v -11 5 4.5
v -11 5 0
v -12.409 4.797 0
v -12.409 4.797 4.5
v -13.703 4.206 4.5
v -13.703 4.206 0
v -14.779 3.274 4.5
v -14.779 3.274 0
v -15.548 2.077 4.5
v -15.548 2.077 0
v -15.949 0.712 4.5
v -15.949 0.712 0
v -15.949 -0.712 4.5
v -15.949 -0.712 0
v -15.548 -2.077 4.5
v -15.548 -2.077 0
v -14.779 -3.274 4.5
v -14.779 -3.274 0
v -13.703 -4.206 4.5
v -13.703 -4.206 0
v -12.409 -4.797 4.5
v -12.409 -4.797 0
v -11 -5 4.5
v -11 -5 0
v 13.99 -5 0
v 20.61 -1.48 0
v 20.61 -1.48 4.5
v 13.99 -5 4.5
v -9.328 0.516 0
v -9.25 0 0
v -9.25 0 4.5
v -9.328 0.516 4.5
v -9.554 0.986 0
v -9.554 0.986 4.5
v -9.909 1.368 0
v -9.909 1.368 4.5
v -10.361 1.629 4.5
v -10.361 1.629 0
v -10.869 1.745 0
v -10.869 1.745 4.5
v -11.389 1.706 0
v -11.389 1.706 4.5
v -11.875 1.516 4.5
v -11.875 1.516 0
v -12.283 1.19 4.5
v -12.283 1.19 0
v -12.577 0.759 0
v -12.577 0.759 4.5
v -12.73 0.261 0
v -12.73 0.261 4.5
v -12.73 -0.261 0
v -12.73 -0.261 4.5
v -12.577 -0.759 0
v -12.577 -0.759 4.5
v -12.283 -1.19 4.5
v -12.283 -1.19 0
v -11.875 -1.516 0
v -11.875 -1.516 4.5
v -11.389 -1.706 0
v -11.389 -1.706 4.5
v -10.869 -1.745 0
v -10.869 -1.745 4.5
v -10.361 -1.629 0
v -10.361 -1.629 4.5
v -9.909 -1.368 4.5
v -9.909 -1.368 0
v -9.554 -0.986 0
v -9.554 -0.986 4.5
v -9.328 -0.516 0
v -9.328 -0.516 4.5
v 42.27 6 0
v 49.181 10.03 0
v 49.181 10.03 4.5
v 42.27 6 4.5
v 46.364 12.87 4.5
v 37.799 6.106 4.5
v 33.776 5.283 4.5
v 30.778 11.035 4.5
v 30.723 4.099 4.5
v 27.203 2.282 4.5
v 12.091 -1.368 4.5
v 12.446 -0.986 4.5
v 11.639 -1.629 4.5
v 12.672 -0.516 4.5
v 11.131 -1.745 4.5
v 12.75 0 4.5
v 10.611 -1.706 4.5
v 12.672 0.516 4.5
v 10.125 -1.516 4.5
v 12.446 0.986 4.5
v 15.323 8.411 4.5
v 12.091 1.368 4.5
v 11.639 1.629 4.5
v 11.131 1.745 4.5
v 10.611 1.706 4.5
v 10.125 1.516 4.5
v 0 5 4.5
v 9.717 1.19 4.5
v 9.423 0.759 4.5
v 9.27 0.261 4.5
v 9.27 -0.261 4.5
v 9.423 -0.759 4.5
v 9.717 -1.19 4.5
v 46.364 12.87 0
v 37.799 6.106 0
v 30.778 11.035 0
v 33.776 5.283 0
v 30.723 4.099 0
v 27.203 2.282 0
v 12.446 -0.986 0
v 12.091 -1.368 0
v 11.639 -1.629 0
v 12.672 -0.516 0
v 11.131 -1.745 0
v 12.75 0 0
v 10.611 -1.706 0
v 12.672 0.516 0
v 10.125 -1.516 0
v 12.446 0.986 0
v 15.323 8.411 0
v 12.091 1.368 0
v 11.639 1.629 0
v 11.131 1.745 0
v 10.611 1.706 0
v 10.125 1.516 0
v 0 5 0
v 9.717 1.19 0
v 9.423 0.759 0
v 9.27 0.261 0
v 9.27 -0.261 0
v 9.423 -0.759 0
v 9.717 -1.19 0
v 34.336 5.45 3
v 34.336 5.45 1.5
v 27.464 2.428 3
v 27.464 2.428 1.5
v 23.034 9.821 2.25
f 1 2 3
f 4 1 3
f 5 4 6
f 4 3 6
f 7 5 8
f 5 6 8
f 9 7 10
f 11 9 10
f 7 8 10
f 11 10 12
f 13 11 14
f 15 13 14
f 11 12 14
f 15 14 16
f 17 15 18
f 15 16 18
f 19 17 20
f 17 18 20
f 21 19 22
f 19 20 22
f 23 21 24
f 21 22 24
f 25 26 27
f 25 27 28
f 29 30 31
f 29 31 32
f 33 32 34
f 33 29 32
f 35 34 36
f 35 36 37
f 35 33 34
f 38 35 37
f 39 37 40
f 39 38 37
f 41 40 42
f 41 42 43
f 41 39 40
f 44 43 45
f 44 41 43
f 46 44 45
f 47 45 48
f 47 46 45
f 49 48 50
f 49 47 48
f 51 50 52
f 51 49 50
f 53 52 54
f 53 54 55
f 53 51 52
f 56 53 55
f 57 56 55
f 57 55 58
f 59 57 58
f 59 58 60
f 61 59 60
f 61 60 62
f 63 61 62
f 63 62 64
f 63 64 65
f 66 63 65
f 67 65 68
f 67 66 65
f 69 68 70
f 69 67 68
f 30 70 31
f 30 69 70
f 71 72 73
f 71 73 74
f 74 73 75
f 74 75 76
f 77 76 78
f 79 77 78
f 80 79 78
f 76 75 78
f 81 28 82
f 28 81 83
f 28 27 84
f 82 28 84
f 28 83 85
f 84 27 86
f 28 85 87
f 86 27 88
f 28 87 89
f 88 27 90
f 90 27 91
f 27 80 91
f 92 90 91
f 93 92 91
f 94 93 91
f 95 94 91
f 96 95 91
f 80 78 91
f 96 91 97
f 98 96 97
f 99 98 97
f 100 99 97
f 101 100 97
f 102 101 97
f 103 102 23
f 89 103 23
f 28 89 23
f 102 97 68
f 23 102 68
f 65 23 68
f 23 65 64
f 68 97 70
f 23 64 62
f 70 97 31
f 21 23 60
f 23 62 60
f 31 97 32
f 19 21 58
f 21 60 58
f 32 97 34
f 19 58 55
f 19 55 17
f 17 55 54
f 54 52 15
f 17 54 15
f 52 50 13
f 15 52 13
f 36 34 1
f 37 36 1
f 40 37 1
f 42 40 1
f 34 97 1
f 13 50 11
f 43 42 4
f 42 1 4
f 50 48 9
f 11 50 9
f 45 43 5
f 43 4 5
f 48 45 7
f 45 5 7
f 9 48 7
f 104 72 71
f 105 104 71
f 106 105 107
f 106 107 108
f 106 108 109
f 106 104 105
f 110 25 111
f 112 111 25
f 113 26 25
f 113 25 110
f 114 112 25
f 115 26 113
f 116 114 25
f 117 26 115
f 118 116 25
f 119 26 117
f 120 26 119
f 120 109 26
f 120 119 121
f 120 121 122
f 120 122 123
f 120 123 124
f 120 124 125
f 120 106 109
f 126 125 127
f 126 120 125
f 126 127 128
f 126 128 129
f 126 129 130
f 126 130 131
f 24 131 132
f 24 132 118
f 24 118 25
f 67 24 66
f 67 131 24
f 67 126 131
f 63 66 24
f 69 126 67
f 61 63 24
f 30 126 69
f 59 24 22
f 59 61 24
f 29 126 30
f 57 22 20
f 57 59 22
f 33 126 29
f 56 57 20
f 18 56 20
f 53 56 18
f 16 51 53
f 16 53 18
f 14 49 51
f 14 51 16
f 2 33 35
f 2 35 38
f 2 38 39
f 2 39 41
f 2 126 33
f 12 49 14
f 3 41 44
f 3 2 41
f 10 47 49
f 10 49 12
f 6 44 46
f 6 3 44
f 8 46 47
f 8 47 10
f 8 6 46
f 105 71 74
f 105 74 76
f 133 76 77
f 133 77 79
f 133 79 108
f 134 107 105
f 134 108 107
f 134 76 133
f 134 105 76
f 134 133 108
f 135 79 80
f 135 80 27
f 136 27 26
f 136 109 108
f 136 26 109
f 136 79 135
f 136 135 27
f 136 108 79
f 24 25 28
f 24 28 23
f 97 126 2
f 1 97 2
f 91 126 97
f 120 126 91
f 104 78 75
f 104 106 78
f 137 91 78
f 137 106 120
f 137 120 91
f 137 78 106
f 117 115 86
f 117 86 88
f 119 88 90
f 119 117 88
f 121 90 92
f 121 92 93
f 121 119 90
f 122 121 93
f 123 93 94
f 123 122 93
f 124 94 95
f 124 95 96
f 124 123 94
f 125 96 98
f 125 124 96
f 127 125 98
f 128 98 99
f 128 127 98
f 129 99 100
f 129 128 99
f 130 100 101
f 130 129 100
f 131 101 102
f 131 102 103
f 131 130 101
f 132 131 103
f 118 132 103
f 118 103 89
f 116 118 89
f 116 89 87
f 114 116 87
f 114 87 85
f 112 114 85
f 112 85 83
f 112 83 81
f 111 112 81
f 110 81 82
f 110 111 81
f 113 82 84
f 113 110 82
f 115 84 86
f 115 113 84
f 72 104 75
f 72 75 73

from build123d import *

# Parameters (mm, degrees)
SKETCH1_R           = 5
SKETCH1_R_2         = 1.75
BOSS_EXTRUDE1_DEPTH = 4.5
BOSS_EXTRUDE2_START = -4.5
BOSS_EXTRUDE2_DEPTH = 4.5


with BuildPart() as part:
    # Sketch1 → Boss-Extrude1 (new body)
    # profile 1 of 3: a face of its own
    with BuildSketch(Plane.XY):
        with BuildLine():
            Line((-11.000000031, -5), (11, -5))
            ThreePointArc((11, -5), (6, -6e-09), (10.999999988, 5))
            Line((10.999999988, 5), (-11, 5))
            ThreePointArc((-11, 5), (-7.464466094, 3.535533906), (-6, 0))
            ThreePointArc((-6, 0), (-7.464466105, -3.535533917), (-11.000000031, -5))
        make_face()
    # profile 2 of 3: a face of its own
    with BuildSketch(Plane.XY):
        with Locations((-11, 0)):
            Circle(SKETCH1_R)
        with Locations((-11, 0)):
            Circle(SKETCH1_R_2, mode=Mode.SUBTRACT)
    # profile 3 of 3: a face of its own
    with BuildSketch(Plane.XY):
        with Locations((11, 0)):
            Circle(SKETCH1_R)
        with Locations((11, 0)):
            Circle(SKETCH1_R_2, mode=Mode.SUBTRACT)
    extrude(amount=BOSS_EXTRUDE1_DEPTH)

    # Sketch2 → Boss-Extrude2 (add)
    with BuildSketch(Plane.XY.offset(4.5).offset(BOSS_EXTRUDE2_START)):
        with BuildLine():
            Line((46.363989199, 12.87), (49.180795902, 10.03))
            Line((49.180795902, 10.03), (42.27, 6))
            add(Edge.make_bspline(
                [(42.27, 6), (33.457840426, 7.213673904), (27.801569406, 2.343916059), (20.61, -1.48)],
                knots=[0, 0, 0, 0, 1, 1, 1, 1], degree=3))
            Line((20.61, -1.48), (13.99, -5))
            Line((13.99, -5), (11, -5))
            ThreePointArc((11, -5), (16, 0), (11, 5))
            Line((11, 5), (0, 5))
            add(Edge.make_bspline(
                [(0, 5), (22.885517501, 10.707926651), (46.363989199, 12.87)],
                knots=[0, 0, 0, 1, 1, 1], degree=2))
        make_face()
    extrude(amount=BOSS_EXTRUDE2_DEPTH)


solid = part.part
